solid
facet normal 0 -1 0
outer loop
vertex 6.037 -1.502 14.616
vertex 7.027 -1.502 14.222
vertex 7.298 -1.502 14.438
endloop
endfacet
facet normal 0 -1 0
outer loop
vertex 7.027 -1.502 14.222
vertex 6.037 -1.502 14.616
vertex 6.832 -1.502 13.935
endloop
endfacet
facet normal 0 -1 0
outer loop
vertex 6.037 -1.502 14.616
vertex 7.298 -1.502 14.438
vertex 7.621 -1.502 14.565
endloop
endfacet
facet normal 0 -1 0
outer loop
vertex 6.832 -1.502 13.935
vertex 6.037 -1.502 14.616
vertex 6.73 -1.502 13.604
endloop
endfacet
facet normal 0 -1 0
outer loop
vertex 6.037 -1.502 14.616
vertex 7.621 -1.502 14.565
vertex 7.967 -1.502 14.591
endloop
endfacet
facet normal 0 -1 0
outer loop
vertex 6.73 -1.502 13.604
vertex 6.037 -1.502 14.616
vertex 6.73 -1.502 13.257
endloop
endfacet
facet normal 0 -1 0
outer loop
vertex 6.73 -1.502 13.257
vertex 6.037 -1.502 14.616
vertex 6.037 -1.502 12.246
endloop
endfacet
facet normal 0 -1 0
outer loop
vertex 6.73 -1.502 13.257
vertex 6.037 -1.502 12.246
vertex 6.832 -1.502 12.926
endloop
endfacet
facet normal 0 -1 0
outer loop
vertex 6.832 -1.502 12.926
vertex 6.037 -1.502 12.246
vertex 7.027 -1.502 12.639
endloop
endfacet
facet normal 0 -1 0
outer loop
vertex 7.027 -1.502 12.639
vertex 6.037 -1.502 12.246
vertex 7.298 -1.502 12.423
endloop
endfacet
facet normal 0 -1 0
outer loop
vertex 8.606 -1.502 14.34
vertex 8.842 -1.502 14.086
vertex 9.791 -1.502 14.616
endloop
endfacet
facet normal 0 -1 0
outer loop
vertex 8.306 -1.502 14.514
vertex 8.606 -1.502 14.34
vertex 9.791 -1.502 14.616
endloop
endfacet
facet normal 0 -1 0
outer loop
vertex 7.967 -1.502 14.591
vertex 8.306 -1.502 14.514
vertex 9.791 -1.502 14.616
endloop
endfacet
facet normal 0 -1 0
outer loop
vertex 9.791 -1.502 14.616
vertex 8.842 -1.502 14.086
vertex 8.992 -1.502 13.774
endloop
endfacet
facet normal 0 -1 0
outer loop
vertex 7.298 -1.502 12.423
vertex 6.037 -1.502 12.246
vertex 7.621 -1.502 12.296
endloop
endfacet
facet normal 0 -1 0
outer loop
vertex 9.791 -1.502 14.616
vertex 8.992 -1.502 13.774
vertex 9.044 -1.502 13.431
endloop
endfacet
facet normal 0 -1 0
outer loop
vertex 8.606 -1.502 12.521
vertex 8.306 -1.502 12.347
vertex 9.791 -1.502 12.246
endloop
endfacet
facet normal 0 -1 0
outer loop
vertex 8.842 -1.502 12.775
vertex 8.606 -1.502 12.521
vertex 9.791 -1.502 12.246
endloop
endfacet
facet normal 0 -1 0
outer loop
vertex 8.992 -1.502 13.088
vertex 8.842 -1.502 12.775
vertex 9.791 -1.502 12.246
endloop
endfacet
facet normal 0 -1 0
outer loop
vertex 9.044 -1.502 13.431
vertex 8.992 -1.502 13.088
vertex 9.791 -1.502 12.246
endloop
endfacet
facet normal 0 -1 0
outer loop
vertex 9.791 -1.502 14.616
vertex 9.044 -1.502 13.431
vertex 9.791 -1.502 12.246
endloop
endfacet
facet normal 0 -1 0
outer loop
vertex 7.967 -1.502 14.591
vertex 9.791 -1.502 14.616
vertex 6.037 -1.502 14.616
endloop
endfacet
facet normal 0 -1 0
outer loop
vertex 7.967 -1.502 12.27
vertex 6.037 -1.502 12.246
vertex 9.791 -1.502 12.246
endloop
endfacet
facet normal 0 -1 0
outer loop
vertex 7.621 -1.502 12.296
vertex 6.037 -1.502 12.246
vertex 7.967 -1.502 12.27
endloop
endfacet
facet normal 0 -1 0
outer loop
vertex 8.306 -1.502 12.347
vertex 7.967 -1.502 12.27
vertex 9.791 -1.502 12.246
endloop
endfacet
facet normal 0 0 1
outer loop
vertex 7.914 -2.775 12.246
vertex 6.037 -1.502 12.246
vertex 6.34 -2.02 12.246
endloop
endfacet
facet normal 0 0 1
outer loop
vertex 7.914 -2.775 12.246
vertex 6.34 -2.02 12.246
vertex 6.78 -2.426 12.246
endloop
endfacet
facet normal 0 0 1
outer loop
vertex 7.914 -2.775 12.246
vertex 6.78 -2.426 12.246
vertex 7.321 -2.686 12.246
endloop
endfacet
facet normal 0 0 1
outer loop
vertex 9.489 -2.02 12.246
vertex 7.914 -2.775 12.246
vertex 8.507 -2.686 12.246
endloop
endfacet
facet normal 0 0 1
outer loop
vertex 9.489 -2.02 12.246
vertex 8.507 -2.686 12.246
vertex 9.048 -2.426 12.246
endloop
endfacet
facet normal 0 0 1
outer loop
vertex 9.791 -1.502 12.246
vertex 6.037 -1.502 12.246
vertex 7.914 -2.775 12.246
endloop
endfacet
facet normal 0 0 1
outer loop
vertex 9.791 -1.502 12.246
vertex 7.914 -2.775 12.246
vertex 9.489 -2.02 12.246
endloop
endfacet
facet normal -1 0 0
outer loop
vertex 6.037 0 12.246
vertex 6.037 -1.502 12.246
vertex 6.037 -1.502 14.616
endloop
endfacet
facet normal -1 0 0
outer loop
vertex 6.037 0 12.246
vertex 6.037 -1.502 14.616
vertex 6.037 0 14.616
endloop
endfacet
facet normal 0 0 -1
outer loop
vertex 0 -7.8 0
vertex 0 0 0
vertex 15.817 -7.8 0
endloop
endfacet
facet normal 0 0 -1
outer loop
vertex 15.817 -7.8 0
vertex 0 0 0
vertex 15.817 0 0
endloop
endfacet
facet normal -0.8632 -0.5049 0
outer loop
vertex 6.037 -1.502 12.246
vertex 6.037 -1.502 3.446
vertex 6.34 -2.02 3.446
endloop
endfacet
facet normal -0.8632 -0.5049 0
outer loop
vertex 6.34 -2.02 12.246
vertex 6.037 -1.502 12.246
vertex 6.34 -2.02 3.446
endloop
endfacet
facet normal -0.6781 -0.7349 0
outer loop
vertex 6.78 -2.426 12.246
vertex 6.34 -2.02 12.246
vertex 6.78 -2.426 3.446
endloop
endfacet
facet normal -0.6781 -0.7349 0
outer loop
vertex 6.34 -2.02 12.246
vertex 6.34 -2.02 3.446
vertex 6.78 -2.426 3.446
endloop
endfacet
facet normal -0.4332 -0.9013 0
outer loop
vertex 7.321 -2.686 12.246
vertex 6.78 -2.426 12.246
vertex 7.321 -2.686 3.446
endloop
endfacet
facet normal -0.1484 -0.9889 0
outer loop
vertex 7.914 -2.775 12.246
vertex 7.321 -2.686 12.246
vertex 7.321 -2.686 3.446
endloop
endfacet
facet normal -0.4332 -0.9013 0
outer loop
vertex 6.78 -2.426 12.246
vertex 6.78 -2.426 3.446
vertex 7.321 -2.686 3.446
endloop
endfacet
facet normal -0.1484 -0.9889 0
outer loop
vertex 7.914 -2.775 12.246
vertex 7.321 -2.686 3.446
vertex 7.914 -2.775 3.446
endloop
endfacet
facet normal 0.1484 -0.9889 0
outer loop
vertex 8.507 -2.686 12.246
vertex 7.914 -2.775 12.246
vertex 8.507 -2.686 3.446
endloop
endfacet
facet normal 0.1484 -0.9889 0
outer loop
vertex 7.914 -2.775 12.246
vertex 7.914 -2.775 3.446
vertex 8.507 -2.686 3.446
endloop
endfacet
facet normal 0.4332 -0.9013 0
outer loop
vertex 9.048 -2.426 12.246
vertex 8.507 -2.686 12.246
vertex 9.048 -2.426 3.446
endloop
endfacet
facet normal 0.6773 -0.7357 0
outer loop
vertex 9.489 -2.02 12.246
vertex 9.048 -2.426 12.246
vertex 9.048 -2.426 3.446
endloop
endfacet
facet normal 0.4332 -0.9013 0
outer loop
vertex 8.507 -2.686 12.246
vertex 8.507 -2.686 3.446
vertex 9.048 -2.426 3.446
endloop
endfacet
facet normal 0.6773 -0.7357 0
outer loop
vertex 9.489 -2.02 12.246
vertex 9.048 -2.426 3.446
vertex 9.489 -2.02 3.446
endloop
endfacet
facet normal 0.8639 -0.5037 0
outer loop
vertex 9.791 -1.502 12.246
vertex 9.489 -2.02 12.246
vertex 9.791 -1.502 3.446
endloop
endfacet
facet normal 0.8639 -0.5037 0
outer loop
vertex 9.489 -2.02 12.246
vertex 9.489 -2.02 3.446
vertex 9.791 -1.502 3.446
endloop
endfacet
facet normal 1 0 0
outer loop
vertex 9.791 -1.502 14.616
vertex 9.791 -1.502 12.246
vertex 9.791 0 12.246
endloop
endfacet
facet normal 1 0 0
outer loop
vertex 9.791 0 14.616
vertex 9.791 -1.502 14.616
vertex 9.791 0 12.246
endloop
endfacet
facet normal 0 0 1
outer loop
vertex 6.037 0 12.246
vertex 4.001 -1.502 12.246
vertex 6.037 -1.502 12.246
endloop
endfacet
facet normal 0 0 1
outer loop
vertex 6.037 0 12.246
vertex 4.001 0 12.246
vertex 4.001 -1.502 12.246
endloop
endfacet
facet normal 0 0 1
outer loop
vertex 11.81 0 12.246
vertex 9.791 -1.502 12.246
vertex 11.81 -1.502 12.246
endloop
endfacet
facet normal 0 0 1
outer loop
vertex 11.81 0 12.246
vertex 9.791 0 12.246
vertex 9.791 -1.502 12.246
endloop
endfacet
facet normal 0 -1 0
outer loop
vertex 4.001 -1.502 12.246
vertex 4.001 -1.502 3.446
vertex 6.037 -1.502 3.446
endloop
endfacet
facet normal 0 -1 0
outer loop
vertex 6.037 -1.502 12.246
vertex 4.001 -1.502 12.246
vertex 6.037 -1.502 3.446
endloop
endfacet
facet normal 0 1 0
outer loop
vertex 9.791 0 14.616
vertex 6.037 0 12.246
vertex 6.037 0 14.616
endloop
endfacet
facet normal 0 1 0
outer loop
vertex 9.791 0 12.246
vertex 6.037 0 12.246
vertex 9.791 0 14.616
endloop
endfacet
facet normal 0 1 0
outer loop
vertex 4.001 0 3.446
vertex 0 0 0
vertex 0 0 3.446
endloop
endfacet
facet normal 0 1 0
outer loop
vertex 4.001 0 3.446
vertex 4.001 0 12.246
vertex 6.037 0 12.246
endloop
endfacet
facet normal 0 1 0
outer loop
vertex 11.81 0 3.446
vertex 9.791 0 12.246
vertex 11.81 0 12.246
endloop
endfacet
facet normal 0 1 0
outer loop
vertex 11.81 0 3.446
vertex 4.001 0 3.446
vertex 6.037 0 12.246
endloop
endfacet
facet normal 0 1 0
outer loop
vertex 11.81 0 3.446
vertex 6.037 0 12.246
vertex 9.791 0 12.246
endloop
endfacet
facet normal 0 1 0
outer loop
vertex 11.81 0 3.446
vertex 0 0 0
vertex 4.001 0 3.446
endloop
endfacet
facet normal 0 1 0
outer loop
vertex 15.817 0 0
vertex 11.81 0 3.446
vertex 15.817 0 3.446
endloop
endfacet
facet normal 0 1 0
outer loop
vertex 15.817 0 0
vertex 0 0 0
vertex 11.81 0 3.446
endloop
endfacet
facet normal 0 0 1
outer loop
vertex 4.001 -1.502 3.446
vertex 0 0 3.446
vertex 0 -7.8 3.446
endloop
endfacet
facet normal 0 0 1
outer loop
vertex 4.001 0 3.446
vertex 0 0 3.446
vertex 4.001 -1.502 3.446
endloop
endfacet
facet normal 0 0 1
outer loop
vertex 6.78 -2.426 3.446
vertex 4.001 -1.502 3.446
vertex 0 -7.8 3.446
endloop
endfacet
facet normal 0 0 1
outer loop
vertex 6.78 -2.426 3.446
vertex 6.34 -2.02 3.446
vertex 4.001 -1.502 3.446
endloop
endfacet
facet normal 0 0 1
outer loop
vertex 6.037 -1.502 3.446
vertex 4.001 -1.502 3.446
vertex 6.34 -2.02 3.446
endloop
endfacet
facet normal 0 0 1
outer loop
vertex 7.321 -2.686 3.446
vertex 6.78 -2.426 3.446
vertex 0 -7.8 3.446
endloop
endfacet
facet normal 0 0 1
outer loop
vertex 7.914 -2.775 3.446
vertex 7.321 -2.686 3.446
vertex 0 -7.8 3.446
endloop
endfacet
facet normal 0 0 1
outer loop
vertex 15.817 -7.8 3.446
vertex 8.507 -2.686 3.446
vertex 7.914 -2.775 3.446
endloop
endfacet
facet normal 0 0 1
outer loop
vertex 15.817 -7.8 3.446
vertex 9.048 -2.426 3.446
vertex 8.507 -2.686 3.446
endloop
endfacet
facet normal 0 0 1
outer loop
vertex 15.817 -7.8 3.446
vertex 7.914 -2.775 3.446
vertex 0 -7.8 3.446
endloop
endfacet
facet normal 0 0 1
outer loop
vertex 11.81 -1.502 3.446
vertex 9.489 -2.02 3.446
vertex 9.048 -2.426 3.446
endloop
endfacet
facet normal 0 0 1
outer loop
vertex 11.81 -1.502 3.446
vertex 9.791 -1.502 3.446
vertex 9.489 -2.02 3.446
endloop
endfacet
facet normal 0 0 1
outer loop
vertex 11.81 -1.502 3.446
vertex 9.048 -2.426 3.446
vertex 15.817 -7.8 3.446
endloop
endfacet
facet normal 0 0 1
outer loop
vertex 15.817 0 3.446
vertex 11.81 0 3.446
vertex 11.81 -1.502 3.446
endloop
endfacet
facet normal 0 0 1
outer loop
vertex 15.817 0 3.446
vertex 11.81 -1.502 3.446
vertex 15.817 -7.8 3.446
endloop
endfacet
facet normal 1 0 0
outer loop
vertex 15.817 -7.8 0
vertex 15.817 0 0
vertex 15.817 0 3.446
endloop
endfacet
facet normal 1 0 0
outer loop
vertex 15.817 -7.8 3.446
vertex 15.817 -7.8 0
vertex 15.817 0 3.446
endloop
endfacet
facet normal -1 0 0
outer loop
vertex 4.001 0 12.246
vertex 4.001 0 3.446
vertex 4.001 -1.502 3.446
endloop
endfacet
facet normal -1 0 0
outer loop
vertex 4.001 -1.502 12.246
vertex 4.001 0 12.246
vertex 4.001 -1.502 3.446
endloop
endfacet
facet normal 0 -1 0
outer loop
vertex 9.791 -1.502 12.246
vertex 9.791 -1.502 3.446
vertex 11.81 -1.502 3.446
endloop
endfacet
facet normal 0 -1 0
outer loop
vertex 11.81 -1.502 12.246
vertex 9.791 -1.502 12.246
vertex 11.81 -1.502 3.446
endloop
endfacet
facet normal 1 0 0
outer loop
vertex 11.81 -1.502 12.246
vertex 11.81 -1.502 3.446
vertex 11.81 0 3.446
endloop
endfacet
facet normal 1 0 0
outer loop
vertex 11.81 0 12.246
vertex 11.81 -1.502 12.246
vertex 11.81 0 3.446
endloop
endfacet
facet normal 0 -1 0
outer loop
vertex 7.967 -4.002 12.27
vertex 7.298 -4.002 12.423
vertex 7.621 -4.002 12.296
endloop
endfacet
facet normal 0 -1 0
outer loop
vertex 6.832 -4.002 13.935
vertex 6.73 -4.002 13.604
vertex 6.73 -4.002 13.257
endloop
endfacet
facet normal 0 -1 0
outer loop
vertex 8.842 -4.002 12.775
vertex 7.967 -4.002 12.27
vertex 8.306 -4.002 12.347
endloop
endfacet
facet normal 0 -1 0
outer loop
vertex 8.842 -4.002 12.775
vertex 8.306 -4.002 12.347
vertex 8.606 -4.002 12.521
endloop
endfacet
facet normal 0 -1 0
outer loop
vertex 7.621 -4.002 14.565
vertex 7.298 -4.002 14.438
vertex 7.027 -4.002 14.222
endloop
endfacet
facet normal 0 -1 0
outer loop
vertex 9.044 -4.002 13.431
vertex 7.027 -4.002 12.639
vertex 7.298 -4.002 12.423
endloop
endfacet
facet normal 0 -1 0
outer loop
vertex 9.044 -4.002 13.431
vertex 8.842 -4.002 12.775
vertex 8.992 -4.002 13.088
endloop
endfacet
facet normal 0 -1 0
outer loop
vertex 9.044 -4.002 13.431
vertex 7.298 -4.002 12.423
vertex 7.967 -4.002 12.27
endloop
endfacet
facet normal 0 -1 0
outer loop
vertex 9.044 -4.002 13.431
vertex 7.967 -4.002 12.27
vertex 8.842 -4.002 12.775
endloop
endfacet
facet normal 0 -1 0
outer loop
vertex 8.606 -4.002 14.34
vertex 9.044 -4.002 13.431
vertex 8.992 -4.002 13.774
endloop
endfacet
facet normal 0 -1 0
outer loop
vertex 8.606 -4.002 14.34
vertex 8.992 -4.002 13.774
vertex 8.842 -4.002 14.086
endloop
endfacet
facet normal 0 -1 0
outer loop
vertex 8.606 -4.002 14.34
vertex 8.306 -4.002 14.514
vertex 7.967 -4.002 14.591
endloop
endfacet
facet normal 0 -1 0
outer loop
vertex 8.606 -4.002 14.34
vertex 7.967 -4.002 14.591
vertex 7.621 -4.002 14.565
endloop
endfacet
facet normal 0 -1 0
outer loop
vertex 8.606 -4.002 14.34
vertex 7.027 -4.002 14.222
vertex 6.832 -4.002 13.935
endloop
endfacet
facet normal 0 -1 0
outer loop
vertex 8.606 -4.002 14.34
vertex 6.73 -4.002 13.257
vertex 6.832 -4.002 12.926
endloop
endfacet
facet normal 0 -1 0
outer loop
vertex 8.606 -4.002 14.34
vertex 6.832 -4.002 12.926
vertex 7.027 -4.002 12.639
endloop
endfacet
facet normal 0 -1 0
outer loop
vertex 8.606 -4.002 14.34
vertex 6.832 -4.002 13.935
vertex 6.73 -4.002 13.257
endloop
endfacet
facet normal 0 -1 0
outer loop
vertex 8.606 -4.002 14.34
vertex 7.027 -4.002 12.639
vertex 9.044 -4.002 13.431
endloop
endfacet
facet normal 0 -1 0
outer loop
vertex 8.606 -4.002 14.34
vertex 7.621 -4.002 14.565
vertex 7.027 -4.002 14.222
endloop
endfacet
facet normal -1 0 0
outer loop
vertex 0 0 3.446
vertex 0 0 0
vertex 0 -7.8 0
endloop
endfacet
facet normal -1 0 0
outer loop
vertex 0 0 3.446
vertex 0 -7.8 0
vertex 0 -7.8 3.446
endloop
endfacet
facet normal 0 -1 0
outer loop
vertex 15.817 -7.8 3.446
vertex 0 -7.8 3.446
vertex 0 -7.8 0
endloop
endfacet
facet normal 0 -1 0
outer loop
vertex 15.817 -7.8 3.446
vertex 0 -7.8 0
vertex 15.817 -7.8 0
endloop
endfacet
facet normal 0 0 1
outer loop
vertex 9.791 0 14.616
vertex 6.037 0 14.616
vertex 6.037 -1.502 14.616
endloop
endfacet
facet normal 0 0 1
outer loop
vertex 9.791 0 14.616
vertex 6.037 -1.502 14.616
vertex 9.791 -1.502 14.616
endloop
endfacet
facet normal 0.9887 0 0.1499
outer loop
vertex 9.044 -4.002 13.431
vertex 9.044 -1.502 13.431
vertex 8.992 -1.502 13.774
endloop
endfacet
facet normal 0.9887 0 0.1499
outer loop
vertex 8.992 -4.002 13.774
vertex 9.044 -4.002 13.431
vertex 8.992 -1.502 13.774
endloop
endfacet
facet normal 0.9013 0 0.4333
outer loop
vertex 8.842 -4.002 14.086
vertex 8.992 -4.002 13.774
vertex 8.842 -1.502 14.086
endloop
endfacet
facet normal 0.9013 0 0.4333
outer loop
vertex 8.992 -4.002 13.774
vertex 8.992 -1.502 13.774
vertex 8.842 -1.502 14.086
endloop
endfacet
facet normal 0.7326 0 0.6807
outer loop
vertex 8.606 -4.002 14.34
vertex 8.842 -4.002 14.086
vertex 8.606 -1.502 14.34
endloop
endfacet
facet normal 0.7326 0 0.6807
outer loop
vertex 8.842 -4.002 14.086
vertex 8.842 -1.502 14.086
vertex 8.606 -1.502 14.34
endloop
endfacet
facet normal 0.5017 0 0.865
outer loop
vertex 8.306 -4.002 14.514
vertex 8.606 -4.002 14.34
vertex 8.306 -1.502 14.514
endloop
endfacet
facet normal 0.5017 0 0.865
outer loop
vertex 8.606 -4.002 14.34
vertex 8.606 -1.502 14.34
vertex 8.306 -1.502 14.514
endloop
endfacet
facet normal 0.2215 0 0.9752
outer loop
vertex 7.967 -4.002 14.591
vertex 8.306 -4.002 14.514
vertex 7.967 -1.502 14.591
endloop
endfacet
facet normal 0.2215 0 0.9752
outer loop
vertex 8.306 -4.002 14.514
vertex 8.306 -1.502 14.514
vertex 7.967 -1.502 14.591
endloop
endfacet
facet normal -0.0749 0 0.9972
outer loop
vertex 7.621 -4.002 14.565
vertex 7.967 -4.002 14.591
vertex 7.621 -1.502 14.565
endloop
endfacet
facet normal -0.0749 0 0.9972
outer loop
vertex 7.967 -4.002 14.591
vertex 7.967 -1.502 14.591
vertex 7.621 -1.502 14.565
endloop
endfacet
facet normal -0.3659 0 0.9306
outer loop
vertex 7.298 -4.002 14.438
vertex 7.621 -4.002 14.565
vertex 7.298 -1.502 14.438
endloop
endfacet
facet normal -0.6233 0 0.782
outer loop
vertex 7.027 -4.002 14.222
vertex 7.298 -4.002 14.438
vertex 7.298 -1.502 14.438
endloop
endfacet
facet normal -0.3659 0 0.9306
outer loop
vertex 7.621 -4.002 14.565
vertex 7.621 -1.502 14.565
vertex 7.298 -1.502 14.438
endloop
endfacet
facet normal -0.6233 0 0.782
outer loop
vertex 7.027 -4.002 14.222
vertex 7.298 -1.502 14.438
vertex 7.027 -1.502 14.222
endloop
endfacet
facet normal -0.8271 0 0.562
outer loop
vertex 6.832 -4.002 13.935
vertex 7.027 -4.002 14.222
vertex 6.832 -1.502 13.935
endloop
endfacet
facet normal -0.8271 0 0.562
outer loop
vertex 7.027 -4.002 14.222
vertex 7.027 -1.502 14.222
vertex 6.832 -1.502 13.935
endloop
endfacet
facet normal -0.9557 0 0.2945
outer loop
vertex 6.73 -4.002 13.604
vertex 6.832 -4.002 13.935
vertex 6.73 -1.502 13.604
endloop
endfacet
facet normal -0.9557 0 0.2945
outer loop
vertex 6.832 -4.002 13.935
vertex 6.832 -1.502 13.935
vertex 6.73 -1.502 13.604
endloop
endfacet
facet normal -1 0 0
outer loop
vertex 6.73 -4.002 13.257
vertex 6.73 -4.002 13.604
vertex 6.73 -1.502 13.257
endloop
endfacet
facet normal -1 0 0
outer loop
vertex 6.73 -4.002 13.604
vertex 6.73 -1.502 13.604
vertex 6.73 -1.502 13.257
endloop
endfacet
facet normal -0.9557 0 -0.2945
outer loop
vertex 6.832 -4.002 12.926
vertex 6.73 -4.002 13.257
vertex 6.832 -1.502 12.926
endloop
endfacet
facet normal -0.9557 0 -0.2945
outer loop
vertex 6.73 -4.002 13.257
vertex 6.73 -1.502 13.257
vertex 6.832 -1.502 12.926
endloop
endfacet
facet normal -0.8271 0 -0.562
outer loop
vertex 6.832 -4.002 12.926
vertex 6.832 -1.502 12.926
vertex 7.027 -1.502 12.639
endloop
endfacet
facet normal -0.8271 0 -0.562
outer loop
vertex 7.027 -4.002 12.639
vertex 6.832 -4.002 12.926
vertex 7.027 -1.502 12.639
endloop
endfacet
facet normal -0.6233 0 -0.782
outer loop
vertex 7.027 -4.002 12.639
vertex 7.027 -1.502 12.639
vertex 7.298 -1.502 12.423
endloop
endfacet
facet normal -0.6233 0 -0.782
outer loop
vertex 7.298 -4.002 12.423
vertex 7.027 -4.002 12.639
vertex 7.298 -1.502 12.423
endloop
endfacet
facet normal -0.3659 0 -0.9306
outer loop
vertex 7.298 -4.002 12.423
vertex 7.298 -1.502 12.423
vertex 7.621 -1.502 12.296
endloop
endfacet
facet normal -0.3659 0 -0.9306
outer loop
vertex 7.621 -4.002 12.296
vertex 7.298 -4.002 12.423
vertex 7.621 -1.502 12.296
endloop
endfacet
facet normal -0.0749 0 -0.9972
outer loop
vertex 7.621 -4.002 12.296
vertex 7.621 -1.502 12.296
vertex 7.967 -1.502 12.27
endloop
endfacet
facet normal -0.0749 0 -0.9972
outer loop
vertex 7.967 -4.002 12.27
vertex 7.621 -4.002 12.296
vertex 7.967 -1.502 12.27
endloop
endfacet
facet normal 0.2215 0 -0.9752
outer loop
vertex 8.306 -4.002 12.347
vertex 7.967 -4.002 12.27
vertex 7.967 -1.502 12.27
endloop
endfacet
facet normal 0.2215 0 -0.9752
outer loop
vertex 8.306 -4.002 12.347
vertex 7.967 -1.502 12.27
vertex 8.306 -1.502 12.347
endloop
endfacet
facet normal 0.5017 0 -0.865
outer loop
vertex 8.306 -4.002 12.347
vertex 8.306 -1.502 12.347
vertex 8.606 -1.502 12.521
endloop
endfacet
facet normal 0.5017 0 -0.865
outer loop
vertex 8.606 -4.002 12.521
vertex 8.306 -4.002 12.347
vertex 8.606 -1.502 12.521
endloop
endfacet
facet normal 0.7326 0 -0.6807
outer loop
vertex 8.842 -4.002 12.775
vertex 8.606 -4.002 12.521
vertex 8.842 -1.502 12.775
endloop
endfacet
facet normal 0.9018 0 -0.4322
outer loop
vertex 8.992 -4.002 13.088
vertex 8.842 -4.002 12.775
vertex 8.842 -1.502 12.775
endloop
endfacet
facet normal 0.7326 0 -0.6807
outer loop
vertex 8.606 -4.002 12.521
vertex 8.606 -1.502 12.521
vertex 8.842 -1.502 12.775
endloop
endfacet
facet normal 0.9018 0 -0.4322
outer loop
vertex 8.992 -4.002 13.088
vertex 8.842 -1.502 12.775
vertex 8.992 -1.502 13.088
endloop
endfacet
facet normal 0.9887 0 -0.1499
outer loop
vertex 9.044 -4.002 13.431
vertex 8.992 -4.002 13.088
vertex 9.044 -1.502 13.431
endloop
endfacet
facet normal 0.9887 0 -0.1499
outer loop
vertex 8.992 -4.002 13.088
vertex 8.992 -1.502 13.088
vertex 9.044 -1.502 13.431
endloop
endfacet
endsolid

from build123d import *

# Parameters (mm, degrees)
F0_W     = 15.8174857497
F0_H     = 3.4455414861
F1_DEPTH = 7.8
F3_DEPTH = 8.8
F4_W     = 3.7536188029
F4_H     = 1.5020088758
F5_DEPTH = 2.37
F6_R     = 1.163766632
F7_DEPTH = 2.5


with BuildPart() as f1:
    # F0 (on Front) → F1 (new body)
    with BuildSketch(Plane.XZ):
        with Locations((7.9087428749, 1.7227707431)):
            Rectangle(F0_W, F0_H)
    extrude(amount=F1_DEPTH)

    # F2 (on face) → F3 (join)
    with BuildSketch(Plane.XY.offset(3.4455414861)):
        Polygon((11.810105294, -1.5020088758), (11.810105294, 0), (4.0005231276, 0), (4.0005231276, -1.5020088758), (6.037354935, -1.5020088758), (9.7909737378, -1.5020088758), align=None)
        with BuildLine():
            ThreePointArc((6.037354935, -1.5020088758), (7.9141643364, -2.7745180875), (9.7909737378, -1.5020088758))
            Line((9.7909737378, -1.5020088758), (6.037354935, -1.5020088758))
        make_face()
    extrude(amount=F3_DEPTH)

    # F4 (on face) → F5 (join)
    with BuildSketch(Plane.XY.offset(12.2455414861)):
        with Locations((7.9141643364, -0.7510044379)):
            Rectangle(F4_W, F4_H)
    extrude(amount=F5_DEPTH)

    # F6 (on face) → F7 (join)
    with BuildSketch(Plane.XZ.offset(1.5020088758)):
        with Locations((7.8803384677, 13.4305414861)):
            Circle(F6_R)
    extrude(amount=F7_DEPTH)


solid = f1.part
